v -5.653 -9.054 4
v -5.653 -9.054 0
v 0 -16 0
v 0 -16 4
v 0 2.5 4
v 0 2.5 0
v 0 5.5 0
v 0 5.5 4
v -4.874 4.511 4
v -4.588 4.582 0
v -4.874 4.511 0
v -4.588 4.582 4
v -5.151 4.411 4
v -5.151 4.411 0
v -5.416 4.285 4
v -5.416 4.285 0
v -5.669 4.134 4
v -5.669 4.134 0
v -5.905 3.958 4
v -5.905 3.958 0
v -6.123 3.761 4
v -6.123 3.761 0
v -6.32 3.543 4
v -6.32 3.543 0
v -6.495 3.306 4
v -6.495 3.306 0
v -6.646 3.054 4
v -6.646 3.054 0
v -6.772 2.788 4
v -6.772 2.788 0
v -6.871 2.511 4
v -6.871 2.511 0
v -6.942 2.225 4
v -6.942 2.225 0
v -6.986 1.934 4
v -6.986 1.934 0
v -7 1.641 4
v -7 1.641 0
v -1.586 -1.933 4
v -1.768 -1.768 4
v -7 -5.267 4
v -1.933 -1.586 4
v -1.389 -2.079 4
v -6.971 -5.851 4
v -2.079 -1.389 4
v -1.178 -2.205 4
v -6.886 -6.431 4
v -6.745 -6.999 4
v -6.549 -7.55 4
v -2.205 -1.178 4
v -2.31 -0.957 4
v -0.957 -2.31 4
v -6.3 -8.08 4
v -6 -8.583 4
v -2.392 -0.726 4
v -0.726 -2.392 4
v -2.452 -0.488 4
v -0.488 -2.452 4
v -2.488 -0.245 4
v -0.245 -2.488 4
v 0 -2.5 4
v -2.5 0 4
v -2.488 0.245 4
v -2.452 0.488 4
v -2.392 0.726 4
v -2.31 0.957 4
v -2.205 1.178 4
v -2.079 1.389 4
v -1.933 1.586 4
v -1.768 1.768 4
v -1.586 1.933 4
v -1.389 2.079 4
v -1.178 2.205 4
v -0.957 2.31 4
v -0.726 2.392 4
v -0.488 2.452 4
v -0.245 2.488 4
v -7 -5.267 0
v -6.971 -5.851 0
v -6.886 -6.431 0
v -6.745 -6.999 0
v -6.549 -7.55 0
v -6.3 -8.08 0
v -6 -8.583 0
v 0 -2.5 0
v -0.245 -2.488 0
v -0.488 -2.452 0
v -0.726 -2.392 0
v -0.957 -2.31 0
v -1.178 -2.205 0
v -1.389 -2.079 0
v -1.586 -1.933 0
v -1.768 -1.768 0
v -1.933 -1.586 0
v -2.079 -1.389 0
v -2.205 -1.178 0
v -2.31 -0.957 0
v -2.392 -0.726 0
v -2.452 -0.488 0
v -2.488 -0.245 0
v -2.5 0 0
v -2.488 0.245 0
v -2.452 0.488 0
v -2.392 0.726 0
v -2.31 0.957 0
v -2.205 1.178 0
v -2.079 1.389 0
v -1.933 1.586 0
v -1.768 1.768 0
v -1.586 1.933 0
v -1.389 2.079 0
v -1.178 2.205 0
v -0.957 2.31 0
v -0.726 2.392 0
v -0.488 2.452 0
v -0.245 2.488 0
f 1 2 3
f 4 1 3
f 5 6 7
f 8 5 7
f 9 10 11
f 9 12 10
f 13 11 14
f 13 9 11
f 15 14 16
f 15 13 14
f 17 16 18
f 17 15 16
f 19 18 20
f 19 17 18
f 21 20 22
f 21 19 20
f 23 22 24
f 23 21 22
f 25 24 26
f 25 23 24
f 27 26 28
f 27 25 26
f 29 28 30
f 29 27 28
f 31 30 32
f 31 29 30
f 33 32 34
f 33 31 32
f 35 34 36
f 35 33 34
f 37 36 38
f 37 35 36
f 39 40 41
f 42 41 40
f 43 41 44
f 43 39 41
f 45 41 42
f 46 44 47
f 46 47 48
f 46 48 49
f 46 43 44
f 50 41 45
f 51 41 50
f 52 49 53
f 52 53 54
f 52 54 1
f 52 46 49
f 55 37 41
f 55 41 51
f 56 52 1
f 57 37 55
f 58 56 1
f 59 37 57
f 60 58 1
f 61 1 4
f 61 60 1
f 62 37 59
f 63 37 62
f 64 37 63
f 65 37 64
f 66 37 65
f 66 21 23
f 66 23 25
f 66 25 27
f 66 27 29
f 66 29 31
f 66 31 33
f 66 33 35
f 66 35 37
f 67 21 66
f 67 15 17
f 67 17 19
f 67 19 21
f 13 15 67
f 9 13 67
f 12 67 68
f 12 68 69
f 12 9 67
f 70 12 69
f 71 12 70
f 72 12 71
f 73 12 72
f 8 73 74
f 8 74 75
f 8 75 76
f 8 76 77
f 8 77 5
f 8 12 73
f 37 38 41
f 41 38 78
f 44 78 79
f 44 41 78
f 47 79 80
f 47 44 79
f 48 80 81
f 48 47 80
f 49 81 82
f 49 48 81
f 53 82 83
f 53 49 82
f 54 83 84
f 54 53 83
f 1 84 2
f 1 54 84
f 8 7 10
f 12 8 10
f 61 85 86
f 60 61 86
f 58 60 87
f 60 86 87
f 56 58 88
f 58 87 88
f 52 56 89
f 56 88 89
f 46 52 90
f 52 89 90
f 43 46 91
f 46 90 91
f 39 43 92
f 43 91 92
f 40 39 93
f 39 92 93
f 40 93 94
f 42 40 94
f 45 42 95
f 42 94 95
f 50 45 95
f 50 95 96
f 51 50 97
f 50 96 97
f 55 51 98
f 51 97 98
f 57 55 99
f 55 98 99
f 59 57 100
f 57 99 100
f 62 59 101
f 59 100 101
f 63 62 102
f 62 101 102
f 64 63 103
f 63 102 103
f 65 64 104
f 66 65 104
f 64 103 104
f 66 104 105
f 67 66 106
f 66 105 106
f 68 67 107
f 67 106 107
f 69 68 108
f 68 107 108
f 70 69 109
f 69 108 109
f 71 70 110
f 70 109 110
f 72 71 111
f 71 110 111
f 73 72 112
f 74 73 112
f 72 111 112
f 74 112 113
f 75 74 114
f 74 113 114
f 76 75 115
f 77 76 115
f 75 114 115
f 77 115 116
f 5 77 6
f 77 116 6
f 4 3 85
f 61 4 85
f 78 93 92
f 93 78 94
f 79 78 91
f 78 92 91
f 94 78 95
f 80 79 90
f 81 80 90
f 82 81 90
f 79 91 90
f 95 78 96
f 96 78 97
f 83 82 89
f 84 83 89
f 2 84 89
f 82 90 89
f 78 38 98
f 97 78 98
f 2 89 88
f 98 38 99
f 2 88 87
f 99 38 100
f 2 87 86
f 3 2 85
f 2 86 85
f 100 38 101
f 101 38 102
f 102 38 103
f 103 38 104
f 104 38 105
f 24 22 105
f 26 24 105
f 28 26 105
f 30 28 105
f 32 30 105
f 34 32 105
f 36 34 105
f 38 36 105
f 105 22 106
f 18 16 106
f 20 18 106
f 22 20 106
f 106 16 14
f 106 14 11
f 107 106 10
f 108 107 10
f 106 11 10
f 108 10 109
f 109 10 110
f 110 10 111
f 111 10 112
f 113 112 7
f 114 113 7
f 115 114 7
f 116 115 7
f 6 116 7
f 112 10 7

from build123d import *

# Parameters (mm, degrees)
EXTRUDE_1_DEPTH = 4
FILLET_1_R      = 3
FILLET_2_R      = 6


with BuildPart() as part:
    # ｽｹｯﾁ1 → ﾎﾞｽ - 押し出し1 (new body)
    with BuildSketch(Plane.XY):
        with BuildLine():
            Line((0, 2.5), (0, 5.5))
            Line((0, 5.5), (-7, 4.1))
            Line((-7, 4.1), (-7, -7.4))
            Line((-7, -7.4), (0, -16))
            Line((0, -16), (0, -2.5))
            ThreePointArc((0, -2.5), (-2.5, 0), (0, 2.5))
        make_face()
    extrude(amount=EXTRUDE_1_DEPTH)

    # ﾌｨﾚｯﾄ1
    fillet_1_edges = [part.edges().sort_by_distance(p)[0] for p in [
        (-7, 4.1, 2),
    ]]
    fillet(fillet_1_edges, radius=FILLET_1_R)

    # ﾌｨﾚｯﾄ2
    fillet_2_edges = [part.edges().sort_by_distance(p)[0] for p in [
        (-7, -7.4, 2),
    ]]
    fillet(fillet_2_edges, radius=FILLET_2_R)


solid = part.part
